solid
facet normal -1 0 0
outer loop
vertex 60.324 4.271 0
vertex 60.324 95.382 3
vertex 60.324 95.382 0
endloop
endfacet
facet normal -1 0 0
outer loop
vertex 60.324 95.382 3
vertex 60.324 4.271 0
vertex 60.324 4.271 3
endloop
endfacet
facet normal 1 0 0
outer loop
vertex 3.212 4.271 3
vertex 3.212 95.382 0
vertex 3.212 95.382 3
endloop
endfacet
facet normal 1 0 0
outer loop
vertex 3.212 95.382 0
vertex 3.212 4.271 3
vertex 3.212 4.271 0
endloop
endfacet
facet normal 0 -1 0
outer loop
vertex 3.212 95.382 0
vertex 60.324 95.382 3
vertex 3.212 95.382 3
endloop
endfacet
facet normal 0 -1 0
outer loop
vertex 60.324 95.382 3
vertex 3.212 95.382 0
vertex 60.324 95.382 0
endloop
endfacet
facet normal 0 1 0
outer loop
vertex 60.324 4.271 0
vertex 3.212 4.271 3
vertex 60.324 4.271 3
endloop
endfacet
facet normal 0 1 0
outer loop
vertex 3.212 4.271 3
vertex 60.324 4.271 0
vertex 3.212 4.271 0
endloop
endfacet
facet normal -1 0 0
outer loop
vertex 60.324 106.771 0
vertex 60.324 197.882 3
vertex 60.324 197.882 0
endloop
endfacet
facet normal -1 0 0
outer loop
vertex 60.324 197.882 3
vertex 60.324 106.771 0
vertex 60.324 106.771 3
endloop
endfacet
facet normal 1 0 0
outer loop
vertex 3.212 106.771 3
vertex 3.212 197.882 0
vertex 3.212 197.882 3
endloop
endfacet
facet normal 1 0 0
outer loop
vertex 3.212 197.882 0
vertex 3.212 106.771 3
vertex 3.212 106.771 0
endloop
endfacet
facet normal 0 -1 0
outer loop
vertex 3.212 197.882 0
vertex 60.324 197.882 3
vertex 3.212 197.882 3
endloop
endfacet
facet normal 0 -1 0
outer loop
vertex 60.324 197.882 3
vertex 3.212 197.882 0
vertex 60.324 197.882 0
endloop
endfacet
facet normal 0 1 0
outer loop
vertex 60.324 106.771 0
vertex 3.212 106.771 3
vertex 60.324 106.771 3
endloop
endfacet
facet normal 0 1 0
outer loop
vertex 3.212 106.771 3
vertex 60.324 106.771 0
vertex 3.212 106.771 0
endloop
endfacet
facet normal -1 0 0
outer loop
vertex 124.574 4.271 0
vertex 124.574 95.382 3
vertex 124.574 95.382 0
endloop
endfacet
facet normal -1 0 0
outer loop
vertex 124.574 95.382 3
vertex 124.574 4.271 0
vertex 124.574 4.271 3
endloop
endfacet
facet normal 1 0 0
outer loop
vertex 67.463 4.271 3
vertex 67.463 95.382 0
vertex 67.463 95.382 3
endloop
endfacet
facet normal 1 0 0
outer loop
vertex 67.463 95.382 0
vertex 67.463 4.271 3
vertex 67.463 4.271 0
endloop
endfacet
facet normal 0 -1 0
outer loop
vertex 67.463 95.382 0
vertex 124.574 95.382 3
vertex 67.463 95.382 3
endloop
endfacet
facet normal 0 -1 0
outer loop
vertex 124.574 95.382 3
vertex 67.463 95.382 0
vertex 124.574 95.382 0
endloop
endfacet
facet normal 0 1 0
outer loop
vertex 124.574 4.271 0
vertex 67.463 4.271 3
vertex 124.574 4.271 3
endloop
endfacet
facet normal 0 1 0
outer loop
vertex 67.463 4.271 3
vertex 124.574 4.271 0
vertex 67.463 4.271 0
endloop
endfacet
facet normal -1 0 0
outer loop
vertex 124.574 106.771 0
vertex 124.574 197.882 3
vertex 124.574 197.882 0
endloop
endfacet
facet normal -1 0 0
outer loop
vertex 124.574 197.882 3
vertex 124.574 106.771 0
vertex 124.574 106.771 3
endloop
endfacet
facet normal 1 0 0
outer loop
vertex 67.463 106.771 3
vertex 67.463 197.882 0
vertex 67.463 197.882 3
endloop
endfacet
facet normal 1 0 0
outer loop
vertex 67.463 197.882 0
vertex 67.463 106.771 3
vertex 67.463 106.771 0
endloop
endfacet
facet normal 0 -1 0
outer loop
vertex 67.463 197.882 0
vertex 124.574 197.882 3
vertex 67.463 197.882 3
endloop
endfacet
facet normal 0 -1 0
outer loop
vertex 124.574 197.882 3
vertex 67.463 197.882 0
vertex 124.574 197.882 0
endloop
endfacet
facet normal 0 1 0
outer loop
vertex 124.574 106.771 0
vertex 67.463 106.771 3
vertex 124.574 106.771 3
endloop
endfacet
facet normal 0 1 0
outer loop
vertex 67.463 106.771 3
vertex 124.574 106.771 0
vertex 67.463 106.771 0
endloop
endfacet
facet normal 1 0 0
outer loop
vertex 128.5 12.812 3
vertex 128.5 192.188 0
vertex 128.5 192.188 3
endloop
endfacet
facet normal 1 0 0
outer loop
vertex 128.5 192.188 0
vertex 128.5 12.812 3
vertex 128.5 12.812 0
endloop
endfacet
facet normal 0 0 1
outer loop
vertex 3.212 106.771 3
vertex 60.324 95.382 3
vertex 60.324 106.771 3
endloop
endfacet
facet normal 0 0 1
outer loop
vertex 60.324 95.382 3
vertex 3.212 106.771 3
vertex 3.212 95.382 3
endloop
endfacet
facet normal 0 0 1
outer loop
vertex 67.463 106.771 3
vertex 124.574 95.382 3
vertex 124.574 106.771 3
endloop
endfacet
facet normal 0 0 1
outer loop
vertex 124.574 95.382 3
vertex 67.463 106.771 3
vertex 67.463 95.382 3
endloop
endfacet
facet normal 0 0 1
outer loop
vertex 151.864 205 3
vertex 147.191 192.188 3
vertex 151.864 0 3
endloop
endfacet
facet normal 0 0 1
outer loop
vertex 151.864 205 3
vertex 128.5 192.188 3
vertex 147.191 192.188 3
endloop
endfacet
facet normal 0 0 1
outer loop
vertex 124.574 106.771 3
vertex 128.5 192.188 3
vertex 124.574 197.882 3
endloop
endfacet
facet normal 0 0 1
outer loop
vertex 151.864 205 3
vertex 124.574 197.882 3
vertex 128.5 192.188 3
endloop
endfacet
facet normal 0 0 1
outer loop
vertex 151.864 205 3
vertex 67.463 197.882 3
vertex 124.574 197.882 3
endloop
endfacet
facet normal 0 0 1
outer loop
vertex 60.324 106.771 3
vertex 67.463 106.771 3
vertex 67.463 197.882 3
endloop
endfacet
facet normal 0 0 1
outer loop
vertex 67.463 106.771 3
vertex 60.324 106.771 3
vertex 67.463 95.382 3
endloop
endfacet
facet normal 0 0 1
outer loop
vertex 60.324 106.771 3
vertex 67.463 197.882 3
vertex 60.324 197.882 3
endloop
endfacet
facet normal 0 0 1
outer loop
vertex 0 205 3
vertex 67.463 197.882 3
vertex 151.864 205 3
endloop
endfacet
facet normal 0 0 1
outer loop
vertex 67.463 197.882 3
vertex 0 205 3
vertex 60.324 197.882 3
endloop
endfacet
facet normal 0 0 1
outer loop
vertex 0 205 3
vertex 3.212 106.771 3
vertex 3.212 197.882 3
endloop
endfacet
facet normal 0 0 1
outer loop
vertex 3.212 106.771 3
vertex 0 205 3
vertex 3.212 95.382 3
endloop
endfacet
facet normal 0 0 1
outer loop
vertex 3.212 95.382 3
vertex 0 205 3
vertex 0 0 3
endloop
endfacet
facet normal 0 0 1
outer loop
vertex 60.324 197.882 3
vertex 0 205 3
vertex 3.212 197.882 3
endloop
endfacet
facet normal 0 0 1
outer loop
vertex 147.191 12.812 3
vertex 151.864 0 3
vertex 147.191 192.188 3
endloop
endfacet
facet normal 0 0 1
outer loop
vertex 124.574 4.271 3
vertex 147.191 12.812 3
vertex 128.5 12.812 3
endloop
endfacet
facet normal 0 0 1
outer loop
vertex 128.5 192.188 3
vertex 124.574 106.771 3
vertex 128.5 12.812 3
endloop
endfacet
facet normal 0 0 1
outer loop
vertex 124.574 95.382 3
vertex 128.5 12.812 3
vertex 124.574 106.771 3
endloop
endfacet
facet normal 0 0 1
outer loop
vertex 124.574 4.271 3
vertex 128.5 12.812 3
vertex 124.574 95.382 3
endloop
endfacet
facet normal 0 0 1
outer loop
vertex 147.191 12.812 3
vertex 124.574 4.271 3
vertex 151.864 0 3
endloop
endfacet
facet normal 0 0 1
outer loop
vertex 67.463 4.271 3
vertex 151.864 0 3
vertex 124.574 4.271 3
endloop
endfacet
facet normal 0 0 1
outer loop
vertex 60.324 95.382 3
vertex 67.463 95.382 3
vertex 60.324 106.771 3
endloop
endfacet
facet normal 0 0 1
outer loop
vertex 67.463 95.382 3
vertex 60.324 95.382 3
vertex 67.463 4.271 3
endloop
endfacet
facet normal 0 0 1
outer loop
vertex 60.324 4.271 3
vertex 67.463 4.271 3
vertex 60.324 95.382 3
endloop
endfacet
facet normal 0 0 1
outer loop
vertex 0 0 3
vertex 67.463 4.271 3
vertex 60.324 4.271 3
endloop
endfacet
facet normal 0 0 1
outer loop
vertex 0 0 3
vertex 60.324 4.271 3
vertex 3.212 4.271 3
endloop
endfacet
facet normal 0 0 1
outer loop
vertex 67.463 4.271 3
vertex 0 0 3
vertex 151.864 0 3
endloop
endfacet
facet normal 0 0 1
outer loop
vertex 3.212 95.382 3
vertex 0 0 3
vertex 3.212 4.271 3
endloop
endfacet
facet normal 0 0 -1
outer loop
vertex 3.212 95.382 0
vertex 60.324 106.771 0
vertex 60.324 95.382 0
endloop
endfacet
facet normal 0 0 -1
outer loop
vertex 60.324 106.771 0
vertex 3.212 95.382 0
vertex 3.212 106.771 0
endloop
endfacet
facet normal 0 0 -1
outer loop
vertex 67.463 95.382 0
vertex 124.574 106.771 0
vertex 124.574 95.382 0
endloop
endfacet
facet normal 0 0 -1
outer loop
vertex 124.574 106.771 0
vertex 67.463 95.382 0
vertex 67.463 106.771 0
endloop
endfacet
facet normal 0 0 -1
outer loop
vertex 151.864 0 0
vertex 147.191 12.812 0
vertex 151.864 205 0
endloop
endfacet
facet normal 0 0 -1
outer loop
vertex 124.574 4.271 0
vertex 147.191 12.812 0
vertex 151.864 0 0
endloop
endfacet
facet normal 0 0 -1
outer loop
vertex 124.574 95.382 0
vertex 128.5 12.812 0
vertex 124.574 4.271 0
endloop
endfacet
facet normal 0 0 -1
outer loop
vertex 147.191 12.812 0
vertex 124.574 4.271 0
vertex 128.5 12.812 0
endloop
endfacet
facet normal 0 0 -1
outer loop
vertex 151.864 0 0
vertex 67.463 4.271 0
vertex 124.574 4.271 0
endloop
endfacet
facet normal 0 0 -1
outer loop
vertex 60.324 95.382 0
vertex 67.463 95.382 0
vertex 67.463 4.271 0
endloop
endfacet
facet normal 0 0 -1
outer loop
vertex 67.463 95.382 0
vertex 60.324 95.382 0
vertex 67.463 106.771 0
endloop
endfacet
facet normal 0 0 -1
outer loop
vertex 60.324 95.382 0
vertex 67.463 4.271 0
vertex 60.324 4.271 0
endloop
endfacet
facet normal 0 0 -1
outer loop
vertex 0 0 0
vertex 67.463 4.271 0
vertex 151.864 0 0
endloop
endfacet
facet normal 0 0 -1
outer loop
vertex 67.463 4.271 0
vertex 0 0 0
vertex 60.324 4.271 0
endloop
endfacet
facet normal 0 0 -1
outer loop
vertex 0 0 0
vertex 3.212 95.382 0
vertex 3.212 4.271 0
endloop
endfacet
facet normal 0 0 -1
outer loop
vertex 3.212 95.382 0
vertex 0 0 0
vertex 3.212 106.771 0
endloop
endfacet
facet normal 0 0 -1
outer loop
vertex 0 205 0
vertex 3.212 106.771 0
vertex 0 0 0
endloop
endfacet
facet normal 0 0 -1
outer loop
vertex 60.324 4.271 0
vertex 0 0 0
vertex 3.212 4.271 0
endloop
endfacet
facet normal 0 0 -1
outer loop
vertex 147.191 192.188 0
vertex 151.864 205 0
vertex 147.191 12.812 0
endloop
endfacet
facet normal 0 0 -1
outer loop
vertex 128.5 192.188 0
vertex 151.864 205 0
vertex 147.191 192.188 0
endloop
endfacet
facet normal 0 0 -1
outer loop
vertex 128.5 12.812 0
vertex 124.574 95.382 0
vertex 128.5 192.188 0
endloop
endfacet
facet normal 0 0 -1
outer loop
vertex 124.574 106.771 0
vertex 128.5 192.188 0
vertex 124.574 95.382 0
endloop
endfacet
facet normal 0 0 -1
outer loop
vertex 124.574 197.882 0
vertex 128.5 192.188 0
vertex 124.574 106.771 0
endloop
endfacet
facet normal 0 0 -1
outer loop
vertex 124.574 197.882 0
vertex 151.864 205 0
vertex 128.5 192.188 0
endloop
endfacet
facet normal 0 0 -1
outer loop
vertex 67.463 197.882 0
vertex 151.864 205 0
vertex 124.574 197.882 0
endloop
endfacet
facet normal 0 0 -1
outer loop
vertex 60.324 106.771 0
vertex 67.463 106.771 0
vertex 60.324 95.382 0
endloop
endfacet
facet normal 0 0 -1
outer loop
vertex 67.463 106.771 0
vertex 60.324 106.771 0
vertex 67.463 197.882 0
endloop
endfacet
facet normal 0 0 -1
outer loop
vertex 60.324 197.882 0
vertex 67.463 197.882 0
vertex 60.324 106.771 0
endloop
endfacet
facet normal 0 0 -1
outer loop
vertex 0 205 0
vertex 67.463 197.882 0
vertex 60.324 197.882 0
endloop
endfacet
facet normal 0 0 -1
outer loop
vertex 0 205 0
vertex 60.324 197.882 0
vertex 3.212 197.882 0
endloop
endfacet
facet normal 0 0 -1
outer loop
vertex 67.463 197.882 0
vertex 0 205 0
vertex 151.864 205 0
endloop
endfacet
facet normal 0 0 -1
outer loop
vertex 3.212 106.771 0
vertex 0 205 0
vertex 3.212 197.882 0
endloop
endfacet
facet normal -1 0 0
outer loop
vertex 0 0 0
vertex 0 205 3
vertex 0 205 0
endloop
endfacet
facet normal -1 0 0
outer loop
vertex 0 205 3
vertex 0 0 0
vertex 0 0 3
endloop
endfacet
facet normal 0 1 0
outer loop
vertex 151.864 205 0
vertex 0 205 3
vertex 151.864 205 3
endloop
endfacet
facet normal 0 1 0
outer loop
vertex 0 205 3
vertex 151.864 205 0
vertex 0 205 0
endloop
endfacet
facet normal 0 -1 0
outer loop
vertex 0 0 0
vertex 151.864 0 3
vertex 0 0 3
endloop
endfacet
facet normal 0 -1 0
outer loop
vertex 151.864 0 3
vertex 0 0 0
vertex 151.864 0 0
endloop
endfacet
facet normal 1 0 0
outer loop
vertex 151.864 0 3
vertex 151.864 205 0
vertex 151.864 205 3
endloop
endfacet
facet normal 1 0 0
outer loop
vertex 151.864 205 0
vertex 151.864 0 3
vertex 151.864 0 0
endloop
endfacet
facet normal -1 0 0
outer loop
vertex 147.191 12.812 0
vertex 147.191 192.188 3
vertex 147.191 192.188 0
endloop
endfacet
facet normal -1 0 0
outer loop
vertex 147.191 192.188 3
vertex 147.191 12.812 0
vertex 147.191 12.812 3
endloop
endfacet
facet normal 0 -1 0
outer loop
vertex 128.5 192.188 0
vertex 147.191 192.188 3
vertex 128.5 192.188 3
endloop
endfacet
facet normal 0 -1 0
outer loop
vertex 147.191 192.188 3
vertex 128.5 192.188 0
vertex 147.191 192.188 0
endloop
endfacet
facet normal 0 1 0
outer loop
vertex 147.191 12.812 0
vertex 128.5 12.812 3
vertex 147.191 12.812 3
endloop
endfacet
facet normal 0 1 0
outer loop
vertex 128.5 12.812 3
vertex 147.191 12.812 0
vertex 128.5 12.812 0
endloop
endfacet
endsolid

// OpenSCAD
//////////////////////////////////////////////////GoTalk Now Keyguard
//author: Tim Driskell
//date: 2/8/2016
/////////////////////////////////////////////////


//////////////user inputs////////////////////////
//Screen width of device
height =205;//desired width of the keyguard
//screen height of device
width = 128.5;//desired width of the keyguard
//thickness of keyguard. 3mm recommended
depth = 3;//keyguard thickness

field=4;//[1,2,4,9,16,25]

cols= field>3 ? sqrt(field): 1;//the number of cutouts in relation to the width of the device
rows = field>3 ? sqrt(field) : field;//the number of cutouts in relation to the length of the device



////////////////renderings///////////////////////
keyguard();
translate([width,0,0]){
difference(){
    cube([width/5.5,height,depth]);
    translate([0,height/16,-0.005])
    cube([0.8*width/5.5,0.875*height,depth+0.01]);
}
}
echo(cols);
echo(rows);
///////////////////modules///////////////////////
module keyguard(){
    difference(){
      cube([width,height,depth]);
        inserts();
    }
}
module inserts(){
    
if (field>4){
    cols= sqrt(field);//the number of cutouts in relation to the width of the device
    rows = sqrt(field);//the number of cutouts in relation to the length of the device
}
else {
    cols=field;
    rows=1;
}
    
echo(alpha);
    //alpha changes the size of cutouts. Size of cutout is inversely proportional to alpha
    alpha=1/8;
    //creates cutouts in x-direction
    for (i=[0:cols-1]){
    //creates cutouts in y-direction
        for (j=[0:rows-1]){
    //determines location of each cutout iterations
            translate([width/cols*i+width/(cols*(2*cols+0.25*pow((1/alpha),2))),height/rows*j+height/(rows*(2*rows+(rows*cols)+0.25*pow((1/alpha),2))),-0.005])
    //cutout size proportional to size of keyguard        
            cube([width*(cols/((cols+alpha*2)*(cols))),height*(rows/((rows)*(rows+alpha*2))),depth+0.01]);
            //changing alpha increases cutout size. 
        }
    }
}
